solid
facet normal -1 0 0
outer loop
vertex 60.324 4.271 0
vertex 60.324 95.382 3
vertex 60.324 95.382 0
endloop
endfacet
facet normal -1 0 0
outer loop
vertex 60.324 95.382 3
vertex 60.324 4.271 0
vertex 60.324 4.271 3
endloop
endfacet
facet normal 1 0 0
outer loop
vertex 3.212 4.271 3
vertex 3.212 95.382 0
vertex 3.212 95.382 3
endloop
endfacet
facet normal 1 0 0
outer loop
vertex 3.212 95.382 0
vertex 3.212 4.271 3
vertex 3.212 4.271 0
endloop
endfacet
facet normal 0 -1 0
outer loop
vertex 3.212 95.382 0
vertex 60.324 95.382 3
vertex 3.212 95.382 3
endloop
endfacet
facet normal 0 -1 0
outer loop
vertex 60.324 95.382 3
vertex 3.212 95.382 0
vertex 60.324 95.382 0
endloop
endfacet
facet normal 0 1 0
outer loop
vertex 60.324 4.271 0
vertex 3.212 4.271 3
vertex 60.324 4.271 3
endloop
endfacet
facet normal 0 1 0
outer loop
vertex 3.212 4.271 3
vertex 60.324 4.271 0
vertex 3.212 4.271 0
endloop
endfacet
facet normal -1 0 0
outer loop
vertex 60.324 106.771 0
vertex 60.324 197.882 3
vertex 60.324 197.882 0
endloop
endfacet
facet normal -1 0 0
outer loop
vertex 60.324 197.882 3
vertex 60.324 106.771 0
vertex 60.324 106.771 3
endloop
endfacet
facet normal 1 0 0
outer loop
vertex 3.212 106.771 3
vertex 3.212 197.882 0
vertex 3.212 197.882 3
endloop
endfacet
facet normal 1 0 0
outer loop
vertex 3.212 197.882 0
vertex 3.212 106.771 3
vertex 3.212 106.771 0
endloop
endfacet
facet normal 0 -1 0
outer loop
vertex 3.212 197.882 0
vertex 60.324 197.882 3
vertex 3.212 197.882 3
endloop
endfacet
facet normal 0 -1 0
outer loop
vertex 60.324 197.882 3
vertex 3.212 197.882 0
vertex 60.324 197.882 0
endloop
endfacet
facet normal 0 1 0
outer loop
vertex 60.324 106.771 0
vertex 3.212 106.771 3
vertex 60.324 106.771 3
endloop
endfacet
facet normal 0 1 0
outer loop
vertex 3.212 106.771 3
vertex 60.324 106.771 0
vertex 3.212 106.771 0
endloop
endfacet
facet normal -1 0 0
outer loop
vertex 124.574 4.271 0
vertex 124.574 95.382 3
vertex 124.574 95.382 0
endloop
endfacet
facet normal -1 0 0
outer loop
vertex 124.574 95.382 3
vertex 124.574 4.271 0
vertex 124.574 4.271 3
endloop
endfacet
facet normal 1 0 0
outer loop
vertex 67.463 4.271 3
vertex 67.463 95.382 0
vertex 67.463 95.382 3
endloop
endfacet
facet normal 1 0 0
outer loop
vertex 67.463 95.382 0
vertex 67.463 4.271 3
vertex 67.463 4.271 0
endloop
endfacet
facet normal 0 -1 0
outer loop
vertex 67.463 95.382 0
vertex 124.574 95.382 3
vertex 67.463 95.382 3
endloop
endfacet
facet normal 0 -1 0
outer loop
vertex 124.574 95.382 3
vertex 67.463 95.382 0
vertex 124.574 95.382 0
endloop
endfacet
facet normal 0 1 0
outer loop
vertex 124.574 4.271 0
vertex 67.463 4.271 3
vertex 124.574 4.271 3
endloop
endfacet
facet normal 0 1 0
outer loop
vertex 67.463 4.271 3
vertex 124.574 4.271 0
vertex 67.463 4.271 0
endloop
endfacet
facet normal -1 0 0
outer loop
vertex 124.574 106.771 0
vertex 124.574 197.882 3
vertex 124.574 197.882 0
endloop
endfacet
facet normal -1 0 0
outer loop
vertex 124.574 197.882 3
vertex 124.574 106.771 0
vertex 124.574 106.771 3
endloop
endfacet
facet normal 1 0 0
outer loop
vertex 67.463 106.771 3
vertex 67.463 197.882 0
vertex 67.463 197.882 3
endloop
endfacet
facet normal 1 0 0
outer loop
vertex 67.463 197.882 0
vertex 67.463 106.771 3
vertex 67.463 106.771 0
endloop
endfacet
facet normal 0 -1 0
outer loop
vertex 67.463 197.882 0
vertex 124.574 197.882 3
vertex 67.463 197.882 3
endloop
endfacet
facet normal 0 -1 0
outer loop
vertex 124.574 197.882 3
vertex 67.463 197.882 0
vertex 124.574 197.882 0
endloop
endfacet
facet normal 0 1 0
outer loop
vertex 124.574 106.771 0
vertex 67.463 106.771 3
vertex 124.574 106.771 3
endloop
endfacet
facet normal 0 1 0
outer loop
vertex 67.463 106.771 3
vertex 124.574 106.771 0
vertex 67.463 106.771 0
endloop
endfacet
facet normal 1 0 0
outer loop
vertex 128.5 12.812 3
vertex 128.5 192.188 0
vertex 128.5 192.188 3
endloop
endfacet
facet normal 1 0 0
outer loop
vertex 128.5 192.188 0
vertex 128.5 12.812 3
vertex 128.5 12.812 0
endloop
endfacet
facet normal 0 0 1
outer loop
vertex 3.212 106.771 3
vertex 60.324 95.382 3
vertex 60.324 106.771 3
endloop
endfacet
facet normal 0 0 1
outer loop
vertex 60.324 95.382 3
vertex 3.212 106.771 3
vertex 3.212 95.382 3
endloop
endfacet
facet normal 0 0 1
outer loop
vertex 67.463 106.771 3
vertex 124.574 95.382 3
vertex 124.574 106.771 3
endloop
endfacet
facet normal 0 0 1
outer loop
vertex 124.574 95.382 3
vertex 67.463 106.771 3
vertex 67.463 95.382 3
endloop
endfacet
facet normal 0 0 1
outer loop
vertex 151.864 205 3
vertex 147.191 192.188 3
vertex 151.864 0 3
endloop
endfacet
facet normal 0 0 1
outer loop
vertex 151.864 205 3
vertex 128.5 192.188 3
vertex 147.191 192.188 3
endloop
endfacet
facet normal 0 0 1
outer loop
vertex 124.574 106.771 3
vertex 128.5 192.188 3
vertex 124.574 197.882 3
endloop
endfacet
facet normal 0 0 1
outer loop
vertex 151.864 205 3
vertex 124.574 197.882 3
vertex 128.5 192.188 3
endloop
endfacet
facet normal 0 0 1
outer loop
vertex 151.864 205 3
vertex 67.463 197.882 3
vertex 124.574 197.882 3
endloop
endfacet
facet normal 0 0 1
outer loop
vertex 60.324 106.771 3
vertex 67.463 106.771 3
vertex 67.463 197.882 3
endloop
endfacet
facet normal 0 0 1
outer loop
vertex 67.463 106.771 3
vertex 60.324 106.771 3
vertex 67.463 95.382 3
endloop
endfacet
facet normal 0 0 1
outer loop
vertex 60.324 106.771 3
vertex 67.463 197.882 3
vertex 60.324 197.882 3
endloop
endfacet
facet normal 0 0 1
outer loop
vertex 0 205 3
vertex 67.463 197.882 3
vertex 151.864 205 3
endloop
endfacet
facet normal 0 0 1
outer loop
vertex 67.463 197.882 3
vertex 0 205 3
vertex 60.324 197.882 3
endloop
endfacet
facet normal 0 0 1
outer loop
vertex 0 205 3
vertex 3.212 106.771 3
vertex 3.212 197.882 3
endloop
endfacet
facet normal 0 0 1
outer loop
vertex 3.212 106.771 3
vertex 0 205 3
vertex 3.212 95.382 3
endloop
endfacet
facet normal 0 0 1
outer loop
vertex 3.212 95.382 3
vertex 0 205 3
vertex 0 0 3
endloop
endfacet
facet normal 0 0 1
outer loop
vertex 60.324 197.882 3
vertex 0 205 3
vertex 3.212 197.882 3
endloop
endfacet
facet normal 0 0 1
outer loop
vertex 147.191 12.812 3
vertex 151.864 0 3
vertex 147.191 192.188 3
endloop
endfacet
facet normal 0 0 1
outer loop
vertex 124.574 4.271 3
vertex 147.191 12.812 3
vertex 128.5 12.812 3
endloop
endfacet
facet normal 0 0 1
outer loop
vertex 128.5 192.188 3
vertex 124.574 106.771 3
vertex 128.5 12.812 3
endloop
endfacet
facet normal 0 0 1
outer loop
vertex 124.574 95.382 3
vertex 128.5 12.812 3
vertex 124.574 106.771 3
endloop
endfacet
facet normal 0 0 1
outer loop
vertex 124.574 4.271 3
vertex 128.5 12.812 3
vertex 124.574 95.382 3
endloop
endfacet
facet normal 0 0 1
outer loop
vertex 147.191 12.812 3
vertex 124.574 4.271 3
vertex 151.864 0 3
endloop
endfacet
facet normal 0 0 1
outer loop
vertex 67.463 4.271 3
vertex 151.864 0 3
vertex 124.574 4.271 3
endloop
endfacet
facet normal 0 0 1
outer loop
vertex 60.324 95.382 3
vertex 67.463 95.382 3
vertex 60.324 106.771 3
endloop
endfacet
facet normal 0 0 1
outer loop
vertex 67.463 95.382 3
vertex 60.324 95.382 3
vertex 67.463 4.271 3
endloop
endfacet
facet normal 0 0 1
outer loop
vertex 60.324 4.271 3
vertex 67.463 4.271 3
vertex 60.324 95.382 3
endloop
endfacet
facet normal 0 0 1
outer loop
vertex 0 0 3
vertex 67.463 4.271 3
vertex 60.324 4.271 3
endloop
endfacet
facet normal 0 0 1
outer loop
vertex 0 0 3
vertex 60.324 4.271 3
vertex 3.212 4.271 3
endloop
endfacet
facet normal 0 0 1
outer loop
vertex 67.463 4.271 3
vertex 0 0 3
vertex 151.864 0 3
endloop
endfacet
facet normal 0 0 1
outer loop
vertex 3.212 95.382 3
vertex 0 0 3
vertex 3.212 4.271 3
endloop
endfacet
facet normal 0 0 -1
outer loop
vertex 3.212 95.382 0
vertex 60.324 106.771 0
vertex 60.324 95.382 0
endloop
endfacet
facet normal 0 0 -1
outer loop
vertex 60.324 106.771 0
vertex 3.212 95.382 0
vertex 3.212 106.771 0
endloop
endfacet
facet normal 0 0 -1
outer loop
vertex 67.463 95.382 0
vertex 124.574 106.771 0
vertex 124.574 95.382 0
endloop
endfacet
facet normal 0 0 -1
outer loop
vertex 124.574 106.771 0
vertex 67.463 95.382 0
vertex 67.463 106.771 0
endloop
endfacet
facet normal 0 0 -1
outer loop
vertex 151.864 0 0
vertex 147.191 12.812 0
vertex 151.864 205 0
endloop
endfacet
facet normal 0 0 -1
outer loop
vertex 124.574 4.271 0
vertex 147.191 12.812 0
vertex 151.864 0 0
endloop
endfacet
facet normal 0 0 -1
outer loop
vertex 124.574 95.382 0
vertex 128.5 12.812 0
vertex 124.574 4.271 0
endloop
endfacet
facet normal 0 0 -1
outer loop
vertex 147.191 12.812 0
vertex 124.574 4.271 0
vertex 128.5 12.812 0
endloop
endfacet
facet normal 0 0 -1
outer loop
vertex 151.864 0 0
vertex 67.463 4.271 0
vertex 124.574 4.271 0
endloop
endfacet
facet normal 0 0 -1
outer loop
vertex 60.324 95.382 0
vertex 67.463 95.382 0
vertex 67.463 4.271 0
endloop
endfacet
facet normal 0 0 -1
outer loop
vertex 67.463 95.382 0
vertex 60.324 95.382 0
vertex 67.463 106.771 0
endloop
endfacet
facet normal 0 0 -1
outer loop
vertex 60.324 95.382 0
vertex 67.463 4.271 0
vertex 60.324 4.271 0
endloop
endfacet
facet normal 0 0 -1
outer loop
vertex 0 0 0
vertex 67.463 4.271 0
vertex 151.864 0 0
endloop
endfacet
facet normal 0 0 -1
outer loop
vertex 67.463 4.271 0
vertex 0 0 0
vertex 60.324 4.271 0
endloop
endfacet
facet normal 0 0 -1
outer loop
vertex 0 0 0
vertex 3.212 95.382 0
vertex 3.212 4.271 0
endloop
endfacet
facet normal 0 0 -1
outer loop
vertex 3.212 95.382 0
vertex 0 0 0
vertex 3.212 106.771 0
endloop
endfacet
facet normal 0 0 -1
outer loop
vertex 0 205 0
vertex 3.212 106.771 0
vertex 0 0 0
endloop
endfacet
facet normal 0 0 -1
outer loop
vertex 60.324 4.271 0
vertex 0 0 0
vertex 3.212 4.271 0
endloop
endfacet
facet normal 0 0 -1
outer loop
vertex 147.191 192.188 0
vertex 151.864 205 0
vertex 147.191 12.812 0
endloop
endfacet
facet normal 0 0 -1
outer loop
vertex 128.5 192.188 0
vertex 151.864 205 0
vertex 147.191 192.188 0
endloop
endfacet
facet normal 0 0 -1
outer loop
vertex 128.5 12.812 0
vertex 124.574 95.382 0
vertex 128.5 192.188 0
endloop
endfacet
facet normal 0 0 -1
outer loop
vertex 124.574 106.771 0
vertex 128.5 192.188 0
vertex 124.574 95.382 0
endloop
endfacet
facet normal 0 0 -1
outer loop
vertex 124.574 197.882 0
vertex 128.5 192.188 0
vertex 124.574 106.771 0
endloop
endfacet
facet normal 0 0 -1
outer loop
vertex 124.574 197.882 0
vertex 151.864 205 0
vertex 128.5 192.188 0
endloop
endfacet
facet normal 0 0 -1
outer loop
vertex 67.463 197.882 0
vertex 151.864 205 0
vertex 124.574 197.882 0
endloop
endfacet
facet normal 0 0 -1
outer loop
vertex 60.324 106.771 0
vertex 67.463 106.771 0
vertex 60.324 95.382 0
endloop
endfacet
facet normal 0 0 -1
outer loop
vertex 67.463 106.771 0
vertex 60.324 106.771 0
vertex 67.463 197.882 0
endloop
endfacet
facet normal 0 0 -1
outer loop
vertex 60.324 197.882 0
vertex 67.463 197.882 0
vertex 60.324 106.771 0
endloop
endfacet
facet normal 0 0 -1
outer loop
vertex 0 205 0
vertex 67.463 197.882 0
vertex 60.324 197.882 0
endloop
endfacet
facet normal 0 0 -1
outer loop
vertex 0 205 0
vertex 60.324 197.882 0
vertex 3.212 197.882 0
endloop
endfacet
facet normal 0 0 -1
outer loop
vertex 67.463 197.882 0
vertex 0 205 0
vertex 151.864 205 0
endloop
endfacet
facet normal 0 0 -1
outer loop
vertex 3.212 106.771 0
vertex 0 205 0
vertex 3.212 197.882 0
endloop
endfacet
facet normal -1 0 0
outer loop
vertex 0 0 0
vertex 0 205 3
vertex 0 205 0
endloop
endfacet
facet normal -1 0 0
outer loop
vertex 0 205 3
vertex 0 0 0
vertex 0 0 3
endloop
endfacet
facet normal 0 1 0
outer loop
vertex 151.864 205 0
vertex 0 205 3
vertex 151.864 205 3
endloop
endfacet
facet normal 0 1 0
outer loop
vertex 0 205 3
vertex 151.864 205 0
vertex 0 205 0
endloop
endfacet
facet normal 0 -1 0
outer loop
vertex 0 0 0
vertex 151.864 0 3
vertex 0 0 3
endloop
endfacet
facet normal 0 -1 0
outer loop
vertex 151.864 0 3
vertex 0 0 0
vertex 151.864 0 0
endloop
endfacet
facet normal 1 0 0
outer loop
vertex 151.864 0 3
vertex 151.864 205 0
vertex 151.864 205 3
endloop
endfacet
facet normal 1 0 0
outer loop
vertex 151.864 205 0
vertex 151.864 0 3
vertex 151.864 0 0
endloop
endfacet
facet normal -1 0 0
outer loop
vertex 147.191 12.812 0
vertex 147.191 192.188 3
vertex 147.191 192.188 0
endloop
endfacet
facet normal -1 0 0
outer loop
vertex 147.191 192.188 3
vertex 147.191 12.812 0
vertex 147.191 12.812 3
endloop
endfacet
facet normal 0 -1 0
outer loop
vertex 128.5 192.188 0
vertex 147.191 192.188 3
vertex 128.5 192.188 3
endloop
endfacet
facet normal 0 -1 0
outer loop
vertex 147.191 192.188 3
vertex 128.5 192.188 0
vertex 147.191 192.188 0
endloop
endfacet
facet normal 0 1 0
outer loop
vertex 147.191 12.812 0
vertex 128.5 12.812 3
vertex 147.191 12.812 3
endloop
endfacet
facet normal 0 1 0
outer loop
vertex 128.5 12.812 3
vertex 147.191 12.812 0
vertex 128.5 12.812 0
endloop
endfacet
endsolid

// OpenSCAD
//////////////////////////////////////////////////GoTalk Now Keyguard
//author: Tim Driskell
//date: 2/8/2016
/////////////////////////////////////////////////


//////////////user inputs////////////////////////
//Screen width of device
height =205;//desired width of the keyguard
//screen height of device
width = 128.5;//desired width of the keyguard
//thickness of keyguard. 3mm recommended
depth = 3;//keyguard thickness

field=4;//[1,2,4,9,16,25]

cols= field>3 ? sqrt(field): 1;//the number of cutouts in relation to the width of the device
rows = field>3 ? sqrt(field) : field;//the number of cutouts in relation to the length of the device



////////////////renderings///////////////////////
keyguard();
translate([width,0,0]){
difference(){
    cube([width/5.5,height,depth]);
    translate([0,height/16,-0.005])
    cube([0.8*width/5.5,0.875*height,depth+0.01]);
}
}
echo(cols);
echo(rows);
///////////////////modules///////////////////////
module keyguard(){
    difference(){
      cube([width,height,depth]);
        inserts();
    }
}
module inserts(){
    
if (field>4){
    cols= sqrt(field);//the number of cutouts in relation to the width of the device
    rows = sqrt(field);//the number of cutouts in relation to the length of the device
}
else {
    cols=field;
    rows=1;
}
    
echo(alpha);
    //alpha changes the size of cutouts. Size of cutout is inversely proportional to alpha
    alpha=1/8;
    //creates cutouts in x-direction
    for (i=[0:cols-1]){
    //creates cutouts in y-direction
        for (j=[0:rows-1]){
    //determines location of each cutout iterations
            translate([width/cols*i+width/(cols*(2*cols+0.25*pow((1/alpha),2))),height/rows*j+height/(rows*(2*rows+(rows*cols)+0.25*pow((1/alpha),2))),-0.005])
    //cutout size proportional to size of keyguard        
            cube([width*(cols/((cols+alpha*2)*(cols))),height*(rows/((rows)*(rows+alpha*2))),depth+0.01]);
            //changing alpha increases cutout size. 
        }
    }
}
